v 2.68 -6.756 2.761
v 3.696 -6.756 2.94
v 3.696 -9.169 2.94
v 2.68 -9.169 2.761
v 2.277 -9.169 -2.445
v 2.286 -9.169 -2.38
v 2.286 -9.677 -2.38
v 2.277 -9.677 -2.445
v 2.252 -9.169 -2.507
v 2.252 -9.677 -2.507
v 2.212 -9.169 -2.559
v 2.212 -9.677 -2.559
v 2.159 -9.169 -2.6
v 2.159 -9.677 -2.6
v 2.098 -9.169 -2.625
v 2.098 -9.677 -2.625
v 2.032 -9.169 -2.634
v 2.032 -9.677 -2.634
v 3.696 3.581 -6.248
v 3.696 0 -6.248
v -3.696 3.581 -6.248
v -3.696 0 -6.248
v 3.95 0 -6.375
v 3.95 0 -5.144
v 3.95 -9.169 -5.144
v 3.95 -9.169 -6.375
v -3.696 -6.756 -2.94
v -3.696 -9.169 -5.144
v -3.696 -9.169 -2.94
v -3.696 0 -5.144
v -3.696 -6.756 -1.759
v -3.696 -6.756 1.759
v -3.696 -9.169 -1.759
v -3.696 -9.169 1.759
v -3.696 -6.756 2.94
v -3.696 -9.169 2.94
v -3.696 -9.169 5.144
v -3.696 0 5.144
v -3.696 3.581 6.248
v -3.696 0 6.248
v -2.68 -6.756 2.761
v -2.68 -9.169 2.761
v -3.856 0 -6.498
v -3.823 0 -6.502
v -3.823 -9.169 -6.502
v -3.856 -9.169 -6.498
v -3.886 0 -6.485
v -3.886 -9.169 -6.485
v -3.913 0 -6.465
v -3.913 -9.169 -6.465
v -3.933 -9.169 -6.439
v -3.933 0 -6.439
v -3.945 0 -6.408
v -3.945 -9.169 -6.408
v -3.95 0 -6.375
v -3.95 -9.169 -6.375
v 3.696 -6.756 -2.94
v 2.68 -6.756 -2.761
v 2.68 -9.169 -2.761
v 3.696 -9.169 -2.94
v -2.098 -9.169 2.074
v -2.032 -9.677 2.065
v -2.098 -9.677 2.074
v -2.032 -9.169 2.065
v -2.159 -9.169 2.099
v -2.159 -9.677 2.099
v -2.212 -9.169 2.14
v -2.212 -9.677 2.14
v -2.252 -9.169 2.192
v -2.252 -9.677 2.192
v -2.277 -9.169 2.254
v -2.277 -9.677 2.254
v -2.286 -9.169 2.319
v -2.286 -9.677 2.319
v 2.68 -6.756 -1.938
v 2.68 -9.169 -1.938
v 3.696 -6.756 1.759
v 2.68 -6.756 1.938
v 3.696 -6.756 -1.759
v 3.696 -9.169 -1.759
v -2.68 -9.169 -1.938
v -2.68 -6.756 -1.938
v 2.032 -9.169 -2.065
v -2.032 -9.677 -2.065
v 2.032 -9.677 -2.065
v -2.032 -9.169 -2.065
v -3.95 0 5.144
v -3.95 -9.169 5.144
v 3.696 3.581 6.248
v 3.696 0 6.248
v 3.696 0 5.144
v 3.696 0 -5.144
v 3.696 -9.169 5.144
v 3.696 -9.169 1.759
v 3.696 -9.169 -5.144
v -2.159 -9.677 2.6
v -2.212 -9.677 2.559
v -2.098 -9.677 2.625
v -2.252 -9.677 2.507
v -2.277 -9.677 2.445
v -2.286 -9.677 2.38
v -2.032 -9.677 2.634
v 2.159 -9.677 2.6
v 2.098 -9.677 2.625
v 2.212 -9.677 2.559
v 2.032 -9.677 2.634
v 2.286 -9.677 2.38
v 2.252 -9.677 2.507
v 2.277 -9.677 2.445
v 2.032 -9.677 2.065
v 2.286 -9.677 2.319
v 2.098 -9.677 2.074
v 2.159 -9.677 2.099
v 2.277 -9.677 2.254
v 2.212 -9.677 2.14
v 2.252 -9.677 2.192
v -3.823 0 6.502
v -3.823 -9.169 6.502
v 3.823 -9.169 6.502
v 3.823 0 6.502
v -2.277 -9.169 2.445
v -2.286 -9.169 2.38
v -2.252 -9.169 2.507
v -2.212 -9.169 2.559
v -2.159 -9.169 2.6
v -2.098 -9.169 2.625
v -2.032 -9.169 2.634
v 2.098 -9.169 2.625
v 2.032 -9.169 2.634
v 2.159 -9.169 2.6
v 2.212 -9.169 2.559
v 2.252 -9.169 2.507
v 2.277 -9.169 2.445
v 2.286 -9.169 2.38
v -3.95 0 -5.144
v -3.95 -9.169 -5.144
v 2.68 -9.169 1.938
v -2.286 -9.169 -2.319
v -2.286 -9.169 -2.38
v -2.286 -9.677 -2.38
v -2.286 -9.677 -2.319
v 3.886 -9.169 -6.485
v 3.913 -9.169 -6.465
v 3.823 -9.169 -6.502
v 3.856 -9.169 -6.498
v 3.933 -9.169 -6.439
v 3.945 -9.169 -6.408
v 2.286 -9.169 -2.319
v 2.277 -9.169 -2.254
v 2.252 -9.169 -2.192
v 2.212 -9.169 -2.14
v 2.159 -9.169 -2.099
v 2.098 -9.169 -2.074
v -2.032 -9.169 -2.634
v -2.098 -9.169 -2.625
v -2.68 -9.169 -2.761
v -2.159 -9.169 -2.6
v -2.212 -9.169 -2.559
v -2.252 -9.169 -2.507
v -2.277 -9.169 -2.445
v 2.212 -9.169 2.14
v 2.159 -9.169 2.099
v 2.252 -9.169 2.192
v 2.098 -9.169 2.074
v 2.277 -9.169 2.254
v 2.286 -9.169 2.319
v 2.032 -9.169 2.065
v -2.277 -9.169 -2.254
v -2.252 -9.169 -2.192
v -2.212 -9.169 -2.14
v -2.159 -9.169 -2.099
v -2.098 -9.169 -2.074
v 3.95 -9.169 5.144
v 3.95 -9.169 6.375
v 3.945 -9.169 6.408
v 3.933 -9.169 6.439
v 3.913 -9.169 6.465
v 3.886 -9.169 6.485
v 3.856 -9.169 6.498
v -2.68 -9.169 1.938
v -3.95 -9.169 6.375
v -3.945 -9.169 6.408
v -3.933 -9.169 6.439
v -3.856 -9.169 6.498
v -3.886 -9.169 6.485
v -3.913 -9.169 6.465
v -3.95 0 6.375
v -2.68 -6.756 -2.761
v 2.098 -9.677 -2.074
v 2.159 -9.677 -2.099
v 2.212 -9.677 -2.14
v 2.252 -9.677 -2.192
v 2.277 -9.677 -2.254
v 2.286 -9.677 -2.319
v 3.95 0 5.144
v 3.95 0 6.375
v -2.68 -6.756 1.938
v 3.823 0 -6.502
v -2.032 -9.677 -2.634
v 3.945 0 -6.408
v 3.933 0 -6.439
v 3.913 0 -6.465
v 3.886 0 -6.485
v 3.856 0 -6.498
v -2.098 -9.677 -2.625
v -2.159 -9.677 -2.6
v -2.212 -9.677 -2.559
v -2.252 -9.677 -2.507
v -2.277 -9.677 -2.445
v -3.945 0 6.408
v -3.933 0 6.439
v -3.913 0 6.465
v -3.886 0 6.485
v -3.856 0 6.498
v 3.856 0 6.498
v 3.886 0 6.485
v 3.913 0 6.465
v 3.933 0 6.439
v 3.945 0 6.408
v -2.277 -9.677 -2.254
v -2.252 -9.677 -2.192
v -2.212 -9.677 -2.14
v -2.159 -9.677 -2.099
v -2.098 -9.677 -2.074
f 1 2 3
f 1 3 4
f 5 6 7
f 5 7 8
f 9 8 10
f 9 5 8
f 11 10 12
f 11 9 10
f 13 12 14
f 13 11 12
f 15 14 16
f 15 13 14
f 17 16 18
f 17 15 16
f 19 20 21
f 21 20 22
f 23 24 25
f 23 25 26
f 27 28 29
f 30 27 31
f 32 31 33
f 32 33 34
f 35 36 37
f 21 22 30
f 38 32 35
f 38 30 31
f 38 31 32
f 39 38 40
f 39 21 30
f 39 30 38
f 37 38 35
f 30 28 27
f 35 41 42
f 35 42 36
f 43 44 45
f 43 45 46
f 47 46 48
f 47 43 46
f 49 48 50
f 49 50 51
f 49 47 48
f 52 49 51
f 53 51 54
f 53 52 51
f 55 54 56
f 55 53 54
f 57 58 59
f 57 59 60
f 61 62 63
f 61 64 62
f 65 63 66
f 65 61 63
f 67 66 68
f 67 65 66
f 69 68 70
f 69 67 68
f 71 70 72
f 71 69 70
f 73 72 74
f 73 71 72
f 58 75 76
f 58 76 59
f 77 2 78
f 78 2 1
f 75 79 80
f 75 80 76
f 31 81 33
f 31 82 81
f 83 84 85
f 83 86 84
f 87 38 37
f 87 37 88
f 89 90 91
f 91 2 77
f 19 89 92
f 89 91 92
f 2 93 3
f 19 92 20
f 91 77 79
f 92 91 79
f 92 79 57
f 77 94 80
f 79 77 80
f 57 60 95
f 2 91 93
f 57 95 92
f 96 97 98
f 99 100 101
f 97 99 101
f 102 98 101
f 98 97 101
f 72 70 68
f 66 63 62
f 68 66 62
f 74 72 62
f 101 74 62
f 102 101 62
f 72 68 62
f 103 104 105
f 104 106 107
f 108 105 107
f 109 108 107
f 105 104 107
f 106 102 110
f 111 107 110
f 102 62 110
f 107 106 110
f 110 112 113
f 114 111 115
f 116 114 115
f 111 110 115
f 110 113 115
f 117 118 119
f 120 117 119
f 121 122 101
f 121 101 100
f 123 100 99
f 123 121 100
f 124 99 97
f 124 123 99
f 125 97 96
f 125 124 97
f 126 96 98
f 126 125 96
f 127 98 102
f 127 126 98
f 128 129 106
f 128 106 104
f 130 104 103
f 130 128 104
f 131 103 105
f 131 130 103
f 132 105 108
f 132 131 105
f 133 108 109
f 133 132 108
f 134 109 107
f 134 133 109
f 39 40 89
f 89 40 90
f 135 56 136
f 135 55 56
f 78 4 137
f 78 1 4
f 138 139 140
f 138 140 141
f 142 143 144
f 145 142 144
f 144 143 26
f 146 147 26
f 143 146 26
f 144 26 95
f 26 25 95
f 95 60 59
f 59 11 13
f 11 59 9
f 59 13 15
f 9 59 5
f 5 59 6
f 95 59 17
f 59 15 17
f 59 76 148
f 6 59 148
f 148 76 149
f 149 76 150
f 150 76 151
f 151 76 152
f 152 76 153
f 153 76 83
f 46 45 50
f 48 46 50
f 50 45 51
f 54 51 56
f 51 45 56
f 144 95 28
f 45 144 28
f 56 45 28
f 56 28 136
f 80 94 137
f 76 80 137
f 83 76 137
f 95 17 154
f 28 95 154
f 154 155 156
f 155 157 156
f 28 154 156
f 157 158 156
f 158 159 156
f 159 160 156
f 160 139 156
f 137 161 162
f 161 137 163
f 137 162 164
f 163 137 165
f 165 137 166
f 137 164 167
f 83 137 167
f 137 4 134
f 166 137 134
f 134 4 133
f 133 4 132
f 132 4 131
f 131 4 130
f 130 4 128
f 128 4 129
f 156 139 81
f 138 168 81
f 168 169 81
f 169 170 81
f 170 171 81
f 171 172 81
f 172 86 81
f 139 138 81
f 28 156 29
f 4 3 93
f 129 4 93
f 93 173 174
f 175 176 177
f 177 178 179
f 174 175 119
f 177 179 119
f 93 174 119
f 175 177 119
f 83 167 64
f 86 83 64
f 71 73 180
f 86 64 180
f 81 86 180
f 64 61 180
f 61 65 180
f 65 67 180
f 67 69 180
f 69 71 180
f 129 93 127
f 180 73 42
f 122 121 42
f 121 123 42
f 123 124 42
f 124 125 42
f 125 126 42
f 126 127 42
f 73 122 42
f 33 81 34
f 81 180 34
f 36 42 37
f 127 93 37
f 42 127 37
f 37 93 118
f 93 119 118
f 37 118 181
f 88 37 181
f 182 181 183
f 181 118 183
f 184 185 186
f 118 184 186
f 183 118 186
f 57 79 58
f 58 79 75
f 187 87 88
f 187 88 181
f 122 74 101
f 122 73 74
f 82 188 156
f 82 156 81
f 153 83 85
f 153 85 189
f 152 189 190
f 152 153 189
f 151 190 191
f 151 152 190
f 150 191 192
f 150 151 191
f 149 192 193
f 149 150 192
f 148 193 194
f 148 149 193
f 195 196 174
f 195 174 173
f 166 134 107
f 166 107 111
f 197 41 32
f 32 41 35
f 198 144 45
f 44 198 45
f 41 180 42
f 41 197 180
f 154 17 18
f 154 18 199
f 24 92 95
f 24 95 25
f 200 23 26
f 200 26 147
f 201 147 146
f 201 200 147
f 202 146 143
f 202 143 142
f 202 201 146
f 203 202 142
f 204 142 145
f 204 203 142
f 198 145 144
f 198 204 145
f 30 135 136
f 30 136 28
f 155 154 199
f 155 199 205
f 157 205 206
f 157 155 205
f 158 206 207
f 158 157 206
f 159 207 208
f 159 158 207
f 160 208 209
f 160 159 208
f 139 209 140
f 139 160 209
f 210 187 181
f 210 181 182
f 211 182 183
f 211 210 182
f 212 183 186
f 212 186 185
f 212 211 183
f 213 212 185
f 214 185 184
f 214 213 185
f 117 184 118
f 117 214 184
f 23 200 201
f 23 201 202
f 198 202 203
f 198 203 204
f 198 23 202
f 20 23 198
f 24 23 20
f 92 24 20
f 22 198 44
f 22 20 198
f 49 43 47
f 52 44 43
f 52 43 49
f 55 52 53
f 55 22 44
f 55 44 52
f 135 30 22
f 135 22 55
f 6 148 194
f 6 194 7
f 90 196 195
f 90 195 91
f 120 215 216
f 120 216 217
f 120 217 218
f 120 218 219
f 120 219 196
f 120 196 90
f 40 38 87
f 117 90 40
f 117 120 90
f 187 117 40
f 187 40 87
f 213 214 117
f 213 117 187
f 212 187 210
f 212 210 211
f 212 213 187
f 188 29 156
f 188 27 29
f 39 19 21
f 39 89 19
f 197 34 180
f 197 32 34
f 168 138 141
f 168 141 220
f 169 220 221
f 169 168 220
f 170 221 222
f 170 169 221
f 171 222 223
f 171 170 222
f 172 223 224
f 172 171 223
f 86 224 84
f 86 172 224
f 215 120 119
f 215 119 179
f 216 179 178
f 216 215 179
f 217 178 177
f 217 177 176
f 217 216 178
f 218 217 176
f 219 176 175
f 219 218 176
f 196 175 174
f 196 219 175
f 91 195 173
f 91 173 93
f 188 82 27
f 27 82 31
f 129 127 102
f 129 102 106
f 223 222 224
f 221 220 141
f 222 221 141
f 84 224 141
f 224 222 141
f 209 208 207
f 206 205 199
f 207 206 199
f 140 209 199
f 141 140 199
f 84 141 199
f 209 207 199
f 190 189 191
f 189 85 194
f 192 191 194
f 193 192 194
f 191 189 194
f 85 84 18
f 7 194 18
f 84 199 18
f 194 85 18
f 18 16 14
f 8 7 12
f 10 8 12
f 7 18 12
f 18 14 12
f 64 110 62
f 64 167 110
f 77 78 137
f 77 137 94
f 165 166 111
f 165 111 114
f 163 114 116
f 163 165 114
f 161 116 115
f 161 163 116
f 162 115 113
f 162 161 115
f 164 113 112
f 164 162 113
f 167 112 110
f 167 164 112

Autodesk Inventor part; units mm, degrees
sketch "Sketch_1" plane through (0, 0, 0) normal (0, 1, 0) x (-1, 0, 0)
  line L0 (3.9497, 5.1435) -> (3.9497, 6.3754)
  arc A0 (3.9497, 6.3754) -> (3.8227, 6.5024) centre (3.8227, 6.3754) ccw
  line L1 (3.8227, 6.5024) -> (-3.8227, 6.5024)
  arc A1 (-3.8227, 6.5024) -> (-3.9497, 6.3754) centre (-3.8227, 6.3754) ccw
  line L2 (-3.9497, 6.3754) -> (-3.9497, 5.1435)
  line L3 (-3.9497, 5.1435) -> (-3.6957, 5.1435)
  line L4 (-3.6957, 5.1435) -> (-3.6957, 2.9397)
  line L5 (-3.6957, 2.9397) -> (-2.6797, 2.7606)
  line L6 (-2.6797, 2.7606) -> (-2.6797, 1.9384)
  line L7 (-2.6797, 1.9384) -> (-3.6957, 1.7593)
  line L8 (-3.6957, 1.7593) -> (-3.6957, -1.7593)
  line L9 (-3.6957, -1.7593) -> (-2.6797, -1.9384)
  line L10 (-2.6797, -1.9384) -> (-2.6797, -2.7606)
  line L11 (-2.6797, -2.7606) -> (-3.6957, -2.9397)
  line L12 (-3.6957, -2.9397) -> (-3.6957, -5.1435)
  line L13 (-3.6957, -5.1435) -> (-3.9497, -5.1435)
  line L14 (-3.9497, -5.1435) -> (-3.9497, -6.3754)
  arc A2 (-3.9497, -6.3754) -> (-3.8227, -6.5024) centre (-3.8227, -6.3754) ccw
  line L15 (-3.8227, -6.5024) -> (3.8227, -6.5024)
  arc A3 (3.8227, -6.5024) -> (3.9497, -6.3754) centre (3.8227, -6.3754) ccw
  line L16 (3.9497, -6.3754) -> (3.9497, -5.1435)
  line L17 (3.9497, -5.1435) -> (3.6957, -5.1435)
  line L18 (3.6957, -5.1435) -> (3.6957, -2.9397)
  line L19 (3.6957, -2.9397) -> (2.6797, -2.7606)
  line L20 (2.6797, -2.7606) -> (2.6797, -1.9384)
  line L21 (2.6797, -1.9384) -> (3.6957, -1.7593)
  line L22 (3.6957, -1.7593) -> (3.6957, 1.7593)
  line L23 (3.6957, 1.7593) -> (2.6797, 1.9384)
  line L24 (2.6797, 1.9384) -> (2.6797, 2.7606)
  line L25 (2.6797, 2.7606) -> (3.6957, 2.9397)
  line L26 (3.6957, 2.9397) -> (3.6957, 5.1435)
  line L27 (3.6957, 5.1435) -> (3.9497, 5.1435)
extrude "Extrusion1" add sketch "Sketch_1" against normal blind 9.1694
sketch "Sketch_2" plane through (0, 0, 0) normal (0, 1, 0) x (-1, 0, 0)
  line L0 (3.6957, 6.2484) -> (-3.6957, 6.2484)
  line L1 (-3.6957, 6.2484) -> (-3.6957, -6.2484)
  line L2 (-3.6957, -6.2484) -> (3.6957, -6.2484)
  line L3 (3.6957, -6.2484) -> (3.6957, 6.2484)
extrude "Extrusion2" add sketch "Sketch_2" along normal blind 3.5814
sketch "Sketch_28" plane through (0, 0, 0) normal (0, 1, 0) x (-1, 0, 0)
  line L0 (3.6957, 6.2484) -> (-3.6957, 6.2484)
  line L1 (-3.6957, 6.2484) -> (-3.6957, -6.2484)
  line L2 (-3.6957, -6.2484) -> (3.6957, -6.2484)
  line L3 (3.6957, -6.2484) -> (3.6957, 6.2484)
extrude "Extrusion3" add sketch "Sketch_28" against normal blind 6.7564
sketch "Sketch_9" plane through (0, -9.1694, 0) normal (0, 1, 0) x (1, 0, 0)
  arc A0 (-2.286, 2.3194) -> (-2.032, 2.0654) centre (-2.032, 2.3194) ccw
  line L0 (-2.032, 2.0654) -> (2.032, 2.0654)
  arc A1 (2.032, 2.0654) -> (2.286, 2.3194) centre (2.032, 2.3194) ccw
  line L1 (2.286, 2.3194) -> (2.286, 2.3796)
  arc A2 (2.286, 2.3796) -> (2.032, 2.6336) centre (2.032, 2.3796) ccw
  line L2 (2.032, 2.6336) -> (-2.032, 2.6336)
  arc A3 (-2.032, 2.6336) -> (-2.286, 2.3796) centre (-2.032, 2.3796) ccw
  line L3 (-2.286, 2.3796) -> (-2.286, 2.3194)
extrude "Extrusion4" add sketch "Sketch_9" against normal blind 0.508
sketch "Sketch_10" plane through (0, -9.1694, 0) normal (0, 1, 0) x (1, 0, 0)
  line L0 (-2.286, -2.3194) -> (-2.286, -2.3796)
  arc A0 (-2.286, -2.3796) -> (-2.032, -2.6336) centre (-2.032, -2.3796) ccw
  line L1 (-2.032, -2.6336) -> (2.032, -2.6336)
  arc A1 (2.032, -2.6336) -> (2.286, -2.3796) centre (2.032, -2.3796) ccw
  line L2 (2.286, -2.3796) -> (2.286, -2.3194)
  arc A2 (2.286, -2.3194) -> (2.032, -2.0654) centre (2.032, -2.3194) ccw
  line L3 (2.032, -2.0654) -> (-2.032, -2.0654)
  arc A3 (-2.032, -2.0654) -> (-2.286, -2.3194) centre (-2.032, -2.3194) ccw
extrude "Extrusion5" add sketch "Sketch_10" against normal blind 0.508
ref_plane "to_bm_terminals_XY" through (0, -8.9154, 0) normal (0, -1, 0) x (1, 0, 0)
ref_plane "to_bm_terminals_YZ" through (0, -8.9154, 0) normal (1, 0, 0) x (0, 0, 1)
ref_plane "to_bm_terminals_ZX" through (0, -8.9154, 0) normal (0, 0, 1) x (0, -1, 0)
ref_plane "to_bodycover_XY" through (0, 3.5814, 0) normal (0, -1, 0) x (1, 0, 0)
ref_plane "to_bodycover_YZ" through (0, 3.5814, 0) normal (1, 0, 0) x (0, 0, 1)
ref_plane "to_bodycover_ZX" through (0, 3.5814, 0) normal (0, 0, 1) x (0, -1, 0)
ref_plane "to_dummy_XY" through (0, 0, 0) normal (0, -1, 0) x (1, 0, 0)
ref_plane "to_dummy_YZ" through (0, 0, 0) normal (1, 0, 0) x (0, 0, 1)
ref_plane "to_dummy_ZX" through (0, 0, 0) normal (0, 0, 1) x (0, -1, 0)
properties part number "MB2011-body"
